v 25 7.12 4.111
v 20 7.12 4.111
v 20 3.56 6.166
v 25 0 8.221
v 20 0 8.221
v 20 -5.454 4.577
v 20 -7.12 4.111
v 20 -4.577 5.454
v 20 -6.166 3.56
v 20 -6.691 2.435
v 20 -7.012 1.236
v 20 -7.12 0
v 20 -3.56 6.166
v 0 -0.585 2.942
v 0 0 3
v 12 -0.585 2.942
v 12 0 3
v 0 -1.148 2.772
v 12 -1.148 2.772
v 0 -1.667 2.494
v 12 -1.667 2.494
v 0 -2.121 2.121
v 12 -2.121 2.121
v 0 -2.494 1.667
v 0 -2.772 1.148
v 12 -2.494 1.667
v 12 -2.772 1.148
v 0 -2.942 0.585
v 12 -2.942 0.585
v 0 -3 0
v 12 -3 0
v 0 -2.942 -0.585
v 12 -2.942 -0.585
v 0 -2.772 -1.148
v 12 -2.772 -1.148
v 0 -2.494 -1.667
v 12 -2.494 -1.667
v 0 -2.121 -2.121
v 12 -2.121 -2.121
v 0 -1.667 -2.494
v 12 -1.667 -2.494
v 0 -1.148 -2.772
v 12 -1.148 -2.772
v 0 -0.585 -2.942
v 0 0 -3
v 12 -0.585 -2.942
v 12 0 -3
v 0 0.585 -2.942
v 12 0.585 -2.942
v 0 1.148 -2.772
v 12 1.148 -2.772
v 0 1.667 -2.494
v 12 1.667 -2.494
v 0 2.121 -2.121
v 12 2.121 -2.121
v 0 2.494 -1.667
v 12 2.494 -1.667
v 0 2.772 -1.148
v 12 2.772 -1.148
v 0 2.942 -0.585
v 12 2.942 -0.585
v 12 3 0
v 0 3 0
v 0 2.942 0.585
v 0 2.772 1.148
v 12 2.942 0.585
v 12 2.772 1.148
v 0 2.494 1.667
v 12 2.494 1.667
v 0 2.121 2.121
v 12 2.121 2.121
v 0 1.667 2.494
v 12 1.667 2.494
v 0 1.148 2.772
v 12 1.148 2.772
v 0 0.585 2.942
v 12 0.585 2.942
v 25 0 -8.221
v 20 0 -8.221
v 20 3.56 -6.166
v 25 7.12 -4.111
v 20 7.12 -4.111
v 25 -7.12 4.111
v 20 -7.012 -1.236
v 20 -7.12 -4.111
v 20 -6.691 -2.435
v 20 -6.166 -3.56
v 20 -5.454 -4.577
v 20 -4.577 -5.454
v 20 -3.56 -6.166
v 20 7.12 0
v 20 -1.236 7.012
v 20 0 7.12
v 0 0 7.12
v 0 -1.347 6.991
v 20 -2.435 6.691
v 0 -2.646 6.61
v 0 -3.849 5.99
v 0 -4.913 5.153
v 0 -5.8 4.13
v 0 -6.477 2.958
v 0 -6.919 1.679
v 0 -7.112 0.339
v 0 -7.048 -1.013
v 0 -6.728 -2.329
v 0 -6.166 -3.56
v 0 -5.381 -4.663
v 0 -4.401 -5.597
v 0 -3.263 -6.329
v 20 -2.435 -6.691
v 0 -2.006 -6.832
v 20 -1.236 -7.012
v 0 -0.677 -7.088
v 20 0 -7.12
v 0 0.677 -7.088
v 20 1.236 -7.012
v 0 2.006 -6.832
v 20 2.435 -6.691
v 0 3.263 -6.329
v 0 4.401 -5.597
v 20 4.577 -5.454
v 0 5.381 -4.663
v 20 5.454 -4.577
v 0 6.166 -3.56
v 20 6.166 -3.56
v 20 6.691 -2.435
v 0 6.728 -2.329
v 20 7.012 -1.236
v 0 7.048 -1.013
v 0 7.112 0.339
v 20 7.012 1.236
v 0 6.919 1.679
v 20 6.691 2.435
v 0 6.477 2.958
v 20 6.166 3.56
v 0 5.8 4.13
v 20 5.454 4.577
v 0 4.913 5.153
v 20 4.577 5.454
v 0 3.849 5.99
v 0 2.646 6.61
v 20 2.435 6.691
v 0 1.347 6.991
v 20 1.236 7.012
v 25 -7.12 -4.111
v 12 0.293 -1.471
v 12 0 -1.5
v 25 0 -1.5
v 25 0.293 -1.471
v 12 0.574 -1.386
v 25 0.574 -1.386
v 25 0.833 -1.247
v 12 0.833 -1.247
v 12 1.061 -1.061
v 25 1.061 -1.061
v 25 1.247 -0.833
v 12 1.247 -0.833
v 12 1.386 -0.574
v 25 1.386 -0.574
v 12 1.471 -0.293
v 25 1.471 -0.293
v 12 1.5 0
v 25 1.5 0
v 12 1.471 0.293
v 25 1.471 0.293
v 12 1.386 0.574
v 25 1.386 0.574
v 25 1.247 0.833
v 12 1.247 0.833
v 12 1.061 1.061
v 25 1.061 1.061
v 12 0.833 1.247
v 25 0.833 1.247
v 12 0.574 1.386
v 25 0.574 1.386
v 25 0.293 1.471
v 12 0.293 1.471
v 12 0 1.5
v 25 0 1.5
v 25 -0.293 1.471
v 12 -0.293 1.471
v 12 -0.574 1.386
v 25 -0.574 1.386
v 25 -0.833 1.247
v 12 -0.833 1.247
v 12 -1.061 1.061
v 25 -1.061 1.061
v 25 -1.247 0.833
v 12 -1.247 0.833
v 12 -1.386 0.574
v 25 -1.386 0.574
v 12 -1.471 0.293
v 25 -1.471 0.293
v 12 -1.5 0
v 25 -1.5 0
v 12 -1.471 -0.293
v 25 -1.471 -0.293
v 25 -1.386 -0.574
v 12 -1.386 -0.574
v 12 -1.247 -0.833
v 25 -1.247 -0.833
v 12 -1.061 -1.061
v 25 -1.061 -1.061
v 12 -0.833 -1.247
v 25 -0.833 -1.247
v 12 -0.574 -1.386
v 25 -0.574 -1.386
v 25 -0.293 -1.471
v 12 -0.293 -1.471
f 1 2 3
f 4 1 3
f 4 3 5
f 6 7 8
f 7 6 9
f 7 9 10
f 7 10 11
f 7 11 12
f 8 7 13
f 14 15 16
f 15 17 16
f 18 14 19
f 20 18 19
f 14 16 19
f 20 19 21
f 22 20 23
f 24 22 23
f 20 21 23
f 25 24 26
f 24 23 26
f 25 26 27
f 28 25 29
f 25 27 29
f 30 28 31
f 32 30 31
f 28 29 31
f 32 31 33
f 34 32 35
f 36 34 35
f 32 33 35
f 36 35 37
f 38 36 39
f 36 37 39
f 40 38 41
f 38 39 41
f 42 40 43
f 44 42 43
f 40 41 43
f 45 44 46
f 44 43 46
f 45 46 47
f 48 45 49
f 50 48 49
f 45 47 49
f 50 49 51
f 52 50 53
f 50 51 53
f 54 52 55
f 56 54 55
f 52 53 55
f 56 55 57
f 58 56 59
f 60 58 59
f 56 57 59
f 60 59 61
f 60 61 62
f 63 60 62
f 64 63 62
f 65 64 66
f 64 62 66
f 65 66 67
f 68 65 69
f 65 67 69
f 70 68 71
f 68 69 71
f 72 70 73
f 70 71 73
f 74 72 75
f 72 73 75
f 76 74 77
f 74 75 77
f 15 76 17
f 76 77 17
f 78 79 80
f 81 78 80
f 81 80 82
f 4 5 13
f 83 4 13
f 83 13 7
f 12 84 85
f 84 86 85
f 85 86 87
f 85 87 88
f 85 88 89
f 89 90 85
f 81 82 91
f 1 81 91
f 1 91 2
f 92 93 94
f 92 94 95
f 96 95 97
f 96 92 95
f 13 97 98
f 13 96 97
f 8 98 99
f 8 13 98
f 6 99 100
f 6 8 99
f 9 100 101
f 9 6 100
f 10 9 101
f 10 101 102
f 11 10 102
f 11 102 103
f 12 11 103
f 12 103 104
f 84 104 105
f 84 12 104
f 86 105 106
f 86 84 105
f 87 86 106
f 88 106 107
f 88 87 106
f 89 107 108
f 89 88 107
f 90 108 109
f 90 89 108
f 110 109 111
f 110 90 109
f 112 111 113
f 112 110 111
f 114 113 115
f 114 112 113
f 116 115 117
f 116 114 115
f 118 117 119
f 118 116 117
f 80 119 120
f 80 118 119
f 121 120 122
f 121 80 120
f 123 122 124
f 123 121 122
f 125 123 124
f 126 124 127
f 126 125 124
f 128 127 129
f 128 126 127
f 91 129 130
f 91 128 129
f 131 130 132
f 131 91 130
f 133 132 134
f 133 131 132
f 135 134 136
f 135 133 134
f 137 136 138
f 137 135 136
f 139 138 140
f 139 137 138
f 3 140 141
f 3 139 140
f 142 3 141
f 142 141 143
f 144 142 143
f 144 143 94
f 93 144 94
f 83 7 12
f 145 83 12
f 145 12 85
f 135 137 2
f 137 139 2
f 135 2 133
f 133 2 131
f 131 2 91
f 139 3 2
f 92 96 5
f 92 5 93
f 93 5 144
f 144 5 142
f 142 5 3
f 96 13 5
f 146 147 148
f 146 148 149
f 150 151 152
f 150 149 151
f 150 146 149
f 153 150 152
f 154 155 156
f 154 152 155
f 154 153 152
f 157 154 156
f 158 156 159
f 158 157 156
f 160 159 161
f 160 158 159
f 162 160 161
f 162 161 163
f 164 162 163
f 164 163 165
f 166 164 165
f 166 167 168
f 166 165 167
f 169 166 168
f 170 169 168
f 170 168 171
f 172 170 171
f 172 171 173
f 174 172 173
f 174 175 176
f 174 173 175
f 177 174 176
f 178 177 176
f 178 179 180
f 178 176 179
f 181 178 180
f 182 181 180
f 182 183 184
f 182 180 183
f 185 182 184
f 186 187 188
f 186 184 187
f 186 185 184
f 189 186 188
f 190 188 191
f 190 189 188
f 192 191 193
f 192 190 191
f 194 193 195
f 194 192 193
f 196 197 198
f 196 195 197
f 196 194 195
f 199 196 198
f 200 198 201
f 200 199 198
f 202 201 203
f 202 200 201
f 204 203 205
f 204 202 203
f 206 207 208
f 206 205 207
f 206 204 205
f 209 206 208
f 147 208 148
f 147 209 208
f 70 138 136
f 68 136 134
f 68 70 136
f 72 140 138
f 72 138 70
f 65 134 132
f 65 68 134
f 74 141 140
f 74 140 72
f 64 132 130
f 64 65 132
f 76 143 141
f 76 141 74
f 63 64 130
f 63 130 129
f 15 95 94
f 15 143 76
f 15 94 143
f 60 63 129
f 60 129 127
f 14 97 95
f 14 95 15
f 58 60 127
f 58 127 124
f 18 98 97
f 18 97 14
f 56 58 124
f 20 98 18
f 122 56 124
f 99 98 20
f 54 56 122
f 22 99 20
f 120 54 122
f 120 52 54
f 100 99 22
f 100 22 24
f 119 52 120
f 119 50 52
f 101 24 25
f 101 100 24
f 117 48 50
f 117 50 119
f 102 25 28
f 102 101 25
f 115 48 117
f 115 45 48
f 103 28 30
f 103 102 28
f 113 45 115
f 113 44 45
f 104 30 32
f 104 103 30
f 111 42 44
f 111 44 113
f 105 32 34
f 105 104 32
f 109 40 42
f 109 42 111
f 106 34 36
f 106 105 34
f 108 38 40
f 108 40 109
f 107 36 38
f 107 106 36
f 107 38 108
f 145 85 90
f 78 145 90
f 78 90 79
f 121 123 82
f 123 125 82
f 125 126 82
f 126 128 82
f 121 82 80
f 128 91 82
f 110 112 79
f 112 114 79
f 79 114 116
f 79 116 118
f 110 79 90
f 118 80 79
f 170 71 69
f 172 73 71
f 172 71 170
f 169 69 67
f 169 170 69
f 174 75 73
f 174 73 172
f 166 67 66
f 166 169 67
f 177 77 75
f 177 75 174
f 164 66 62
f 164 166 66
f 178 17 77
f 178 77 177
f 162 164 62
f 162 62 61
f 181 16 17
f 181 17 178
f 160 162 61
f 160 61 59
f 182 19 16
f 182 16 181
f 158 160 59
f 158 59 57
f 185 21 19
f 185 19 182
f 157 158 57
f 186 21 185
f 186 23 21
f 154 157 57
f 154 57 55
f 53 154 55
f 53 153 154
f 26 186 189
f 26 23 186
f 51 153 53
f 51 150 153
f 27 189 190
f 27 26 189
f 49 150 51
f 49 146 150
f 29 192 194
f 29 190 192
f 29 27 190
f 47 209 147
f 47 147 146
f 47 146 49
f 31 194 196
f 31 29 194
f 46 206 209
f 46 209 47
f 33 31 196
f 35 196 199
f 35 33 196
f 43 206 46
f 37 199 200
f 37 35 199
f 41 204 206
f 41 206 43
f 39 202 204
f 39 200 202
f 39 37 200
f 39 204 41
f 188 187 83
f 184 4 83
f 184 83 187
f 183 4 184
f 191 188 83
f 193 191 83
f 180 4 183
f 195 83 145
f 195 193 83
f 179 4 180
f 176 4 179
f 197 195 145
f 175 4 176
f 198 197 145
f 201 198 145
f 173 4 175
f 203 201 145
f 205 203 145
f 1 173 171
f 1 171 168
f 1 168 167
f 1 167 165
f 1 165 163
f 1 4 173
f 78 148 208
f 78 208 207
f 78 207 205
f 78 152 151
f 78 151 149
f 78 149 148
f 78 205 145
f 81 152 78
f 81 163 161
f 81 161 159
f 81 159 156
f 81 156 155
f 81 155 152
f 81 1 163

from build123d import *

# Parameters (mm, degrees)
SKETCH_1_W               = 20
SKETCH_1_H               = 7.12
SKETCH_1_4_W             = 12
SKETCH_1_4_H             = 3
EXTRUDE_1_DEPTH          = 5
CUT_EXTRUDE_1_DEPTH      = 28.263289114
CUT_EXTRUDE_1_DEPTH_BACK = 28.263289114
SKETCH_3_R               = 1.5


with BuildPart() as part:
    # 草图1 → 旋转1 (revolve)
    with BuildSketch(Plane.XY):
        with Locations((10, 3.56)):
            Rectangle(SKETCH_1_W, SKETCH_1_H)
    revolve(axis=Axis((-15.976954312, 0, 0), (1, 0, 0)))

    # 草图1<4> → 切除-旋转1 (revolve, cut)
    with BuildSketch(Plane.XY):
        with Locations((6, 1.5)):
            Rectangle(SKETCH_1_4_W, SKETCH_1_4_H)
    revolve(axis=Axis((-15.976954312, 0, 0), (1, 0, 0)), mode=Mode.SUBTRACT)

    # 草图2 → 凸台-拉伸1 (add)
    with BuildSketch(Plane(origin=(20, 0, 0), x_dir=(0, 0, -1), z_dir=(1, 0, 0))):
        Polygon((8.221467833, 0), (4.110733917, 7.12), (-4.110733917, 7.12), (-8.221467833, 0), (-4.110733917, -7.12), (4.110733917, -7.12), align=None)
    extrude(amount=EXTRUDE_1_DEPTH)

    # 草图3 → 切除-拉伸1 (cut, two sides: drawn at the far end of the back side and taken through both)
    with BuildSketch(Plane(origin=(25, 0, 0), x_dir=(0, 0, -1), z_dir=(1, 0, 0)).offset(-CUT_EXTRUDE_1_DEPTH_BACK)):
        Circle(SKETCH_3_R)
    extrude(amount=CUT_EXTRUDE_1_DEPTH + CUT_EXTRUDE_1_DEPTH_BACK, mode=Mode.SUBTRACT)


solid = part.part
